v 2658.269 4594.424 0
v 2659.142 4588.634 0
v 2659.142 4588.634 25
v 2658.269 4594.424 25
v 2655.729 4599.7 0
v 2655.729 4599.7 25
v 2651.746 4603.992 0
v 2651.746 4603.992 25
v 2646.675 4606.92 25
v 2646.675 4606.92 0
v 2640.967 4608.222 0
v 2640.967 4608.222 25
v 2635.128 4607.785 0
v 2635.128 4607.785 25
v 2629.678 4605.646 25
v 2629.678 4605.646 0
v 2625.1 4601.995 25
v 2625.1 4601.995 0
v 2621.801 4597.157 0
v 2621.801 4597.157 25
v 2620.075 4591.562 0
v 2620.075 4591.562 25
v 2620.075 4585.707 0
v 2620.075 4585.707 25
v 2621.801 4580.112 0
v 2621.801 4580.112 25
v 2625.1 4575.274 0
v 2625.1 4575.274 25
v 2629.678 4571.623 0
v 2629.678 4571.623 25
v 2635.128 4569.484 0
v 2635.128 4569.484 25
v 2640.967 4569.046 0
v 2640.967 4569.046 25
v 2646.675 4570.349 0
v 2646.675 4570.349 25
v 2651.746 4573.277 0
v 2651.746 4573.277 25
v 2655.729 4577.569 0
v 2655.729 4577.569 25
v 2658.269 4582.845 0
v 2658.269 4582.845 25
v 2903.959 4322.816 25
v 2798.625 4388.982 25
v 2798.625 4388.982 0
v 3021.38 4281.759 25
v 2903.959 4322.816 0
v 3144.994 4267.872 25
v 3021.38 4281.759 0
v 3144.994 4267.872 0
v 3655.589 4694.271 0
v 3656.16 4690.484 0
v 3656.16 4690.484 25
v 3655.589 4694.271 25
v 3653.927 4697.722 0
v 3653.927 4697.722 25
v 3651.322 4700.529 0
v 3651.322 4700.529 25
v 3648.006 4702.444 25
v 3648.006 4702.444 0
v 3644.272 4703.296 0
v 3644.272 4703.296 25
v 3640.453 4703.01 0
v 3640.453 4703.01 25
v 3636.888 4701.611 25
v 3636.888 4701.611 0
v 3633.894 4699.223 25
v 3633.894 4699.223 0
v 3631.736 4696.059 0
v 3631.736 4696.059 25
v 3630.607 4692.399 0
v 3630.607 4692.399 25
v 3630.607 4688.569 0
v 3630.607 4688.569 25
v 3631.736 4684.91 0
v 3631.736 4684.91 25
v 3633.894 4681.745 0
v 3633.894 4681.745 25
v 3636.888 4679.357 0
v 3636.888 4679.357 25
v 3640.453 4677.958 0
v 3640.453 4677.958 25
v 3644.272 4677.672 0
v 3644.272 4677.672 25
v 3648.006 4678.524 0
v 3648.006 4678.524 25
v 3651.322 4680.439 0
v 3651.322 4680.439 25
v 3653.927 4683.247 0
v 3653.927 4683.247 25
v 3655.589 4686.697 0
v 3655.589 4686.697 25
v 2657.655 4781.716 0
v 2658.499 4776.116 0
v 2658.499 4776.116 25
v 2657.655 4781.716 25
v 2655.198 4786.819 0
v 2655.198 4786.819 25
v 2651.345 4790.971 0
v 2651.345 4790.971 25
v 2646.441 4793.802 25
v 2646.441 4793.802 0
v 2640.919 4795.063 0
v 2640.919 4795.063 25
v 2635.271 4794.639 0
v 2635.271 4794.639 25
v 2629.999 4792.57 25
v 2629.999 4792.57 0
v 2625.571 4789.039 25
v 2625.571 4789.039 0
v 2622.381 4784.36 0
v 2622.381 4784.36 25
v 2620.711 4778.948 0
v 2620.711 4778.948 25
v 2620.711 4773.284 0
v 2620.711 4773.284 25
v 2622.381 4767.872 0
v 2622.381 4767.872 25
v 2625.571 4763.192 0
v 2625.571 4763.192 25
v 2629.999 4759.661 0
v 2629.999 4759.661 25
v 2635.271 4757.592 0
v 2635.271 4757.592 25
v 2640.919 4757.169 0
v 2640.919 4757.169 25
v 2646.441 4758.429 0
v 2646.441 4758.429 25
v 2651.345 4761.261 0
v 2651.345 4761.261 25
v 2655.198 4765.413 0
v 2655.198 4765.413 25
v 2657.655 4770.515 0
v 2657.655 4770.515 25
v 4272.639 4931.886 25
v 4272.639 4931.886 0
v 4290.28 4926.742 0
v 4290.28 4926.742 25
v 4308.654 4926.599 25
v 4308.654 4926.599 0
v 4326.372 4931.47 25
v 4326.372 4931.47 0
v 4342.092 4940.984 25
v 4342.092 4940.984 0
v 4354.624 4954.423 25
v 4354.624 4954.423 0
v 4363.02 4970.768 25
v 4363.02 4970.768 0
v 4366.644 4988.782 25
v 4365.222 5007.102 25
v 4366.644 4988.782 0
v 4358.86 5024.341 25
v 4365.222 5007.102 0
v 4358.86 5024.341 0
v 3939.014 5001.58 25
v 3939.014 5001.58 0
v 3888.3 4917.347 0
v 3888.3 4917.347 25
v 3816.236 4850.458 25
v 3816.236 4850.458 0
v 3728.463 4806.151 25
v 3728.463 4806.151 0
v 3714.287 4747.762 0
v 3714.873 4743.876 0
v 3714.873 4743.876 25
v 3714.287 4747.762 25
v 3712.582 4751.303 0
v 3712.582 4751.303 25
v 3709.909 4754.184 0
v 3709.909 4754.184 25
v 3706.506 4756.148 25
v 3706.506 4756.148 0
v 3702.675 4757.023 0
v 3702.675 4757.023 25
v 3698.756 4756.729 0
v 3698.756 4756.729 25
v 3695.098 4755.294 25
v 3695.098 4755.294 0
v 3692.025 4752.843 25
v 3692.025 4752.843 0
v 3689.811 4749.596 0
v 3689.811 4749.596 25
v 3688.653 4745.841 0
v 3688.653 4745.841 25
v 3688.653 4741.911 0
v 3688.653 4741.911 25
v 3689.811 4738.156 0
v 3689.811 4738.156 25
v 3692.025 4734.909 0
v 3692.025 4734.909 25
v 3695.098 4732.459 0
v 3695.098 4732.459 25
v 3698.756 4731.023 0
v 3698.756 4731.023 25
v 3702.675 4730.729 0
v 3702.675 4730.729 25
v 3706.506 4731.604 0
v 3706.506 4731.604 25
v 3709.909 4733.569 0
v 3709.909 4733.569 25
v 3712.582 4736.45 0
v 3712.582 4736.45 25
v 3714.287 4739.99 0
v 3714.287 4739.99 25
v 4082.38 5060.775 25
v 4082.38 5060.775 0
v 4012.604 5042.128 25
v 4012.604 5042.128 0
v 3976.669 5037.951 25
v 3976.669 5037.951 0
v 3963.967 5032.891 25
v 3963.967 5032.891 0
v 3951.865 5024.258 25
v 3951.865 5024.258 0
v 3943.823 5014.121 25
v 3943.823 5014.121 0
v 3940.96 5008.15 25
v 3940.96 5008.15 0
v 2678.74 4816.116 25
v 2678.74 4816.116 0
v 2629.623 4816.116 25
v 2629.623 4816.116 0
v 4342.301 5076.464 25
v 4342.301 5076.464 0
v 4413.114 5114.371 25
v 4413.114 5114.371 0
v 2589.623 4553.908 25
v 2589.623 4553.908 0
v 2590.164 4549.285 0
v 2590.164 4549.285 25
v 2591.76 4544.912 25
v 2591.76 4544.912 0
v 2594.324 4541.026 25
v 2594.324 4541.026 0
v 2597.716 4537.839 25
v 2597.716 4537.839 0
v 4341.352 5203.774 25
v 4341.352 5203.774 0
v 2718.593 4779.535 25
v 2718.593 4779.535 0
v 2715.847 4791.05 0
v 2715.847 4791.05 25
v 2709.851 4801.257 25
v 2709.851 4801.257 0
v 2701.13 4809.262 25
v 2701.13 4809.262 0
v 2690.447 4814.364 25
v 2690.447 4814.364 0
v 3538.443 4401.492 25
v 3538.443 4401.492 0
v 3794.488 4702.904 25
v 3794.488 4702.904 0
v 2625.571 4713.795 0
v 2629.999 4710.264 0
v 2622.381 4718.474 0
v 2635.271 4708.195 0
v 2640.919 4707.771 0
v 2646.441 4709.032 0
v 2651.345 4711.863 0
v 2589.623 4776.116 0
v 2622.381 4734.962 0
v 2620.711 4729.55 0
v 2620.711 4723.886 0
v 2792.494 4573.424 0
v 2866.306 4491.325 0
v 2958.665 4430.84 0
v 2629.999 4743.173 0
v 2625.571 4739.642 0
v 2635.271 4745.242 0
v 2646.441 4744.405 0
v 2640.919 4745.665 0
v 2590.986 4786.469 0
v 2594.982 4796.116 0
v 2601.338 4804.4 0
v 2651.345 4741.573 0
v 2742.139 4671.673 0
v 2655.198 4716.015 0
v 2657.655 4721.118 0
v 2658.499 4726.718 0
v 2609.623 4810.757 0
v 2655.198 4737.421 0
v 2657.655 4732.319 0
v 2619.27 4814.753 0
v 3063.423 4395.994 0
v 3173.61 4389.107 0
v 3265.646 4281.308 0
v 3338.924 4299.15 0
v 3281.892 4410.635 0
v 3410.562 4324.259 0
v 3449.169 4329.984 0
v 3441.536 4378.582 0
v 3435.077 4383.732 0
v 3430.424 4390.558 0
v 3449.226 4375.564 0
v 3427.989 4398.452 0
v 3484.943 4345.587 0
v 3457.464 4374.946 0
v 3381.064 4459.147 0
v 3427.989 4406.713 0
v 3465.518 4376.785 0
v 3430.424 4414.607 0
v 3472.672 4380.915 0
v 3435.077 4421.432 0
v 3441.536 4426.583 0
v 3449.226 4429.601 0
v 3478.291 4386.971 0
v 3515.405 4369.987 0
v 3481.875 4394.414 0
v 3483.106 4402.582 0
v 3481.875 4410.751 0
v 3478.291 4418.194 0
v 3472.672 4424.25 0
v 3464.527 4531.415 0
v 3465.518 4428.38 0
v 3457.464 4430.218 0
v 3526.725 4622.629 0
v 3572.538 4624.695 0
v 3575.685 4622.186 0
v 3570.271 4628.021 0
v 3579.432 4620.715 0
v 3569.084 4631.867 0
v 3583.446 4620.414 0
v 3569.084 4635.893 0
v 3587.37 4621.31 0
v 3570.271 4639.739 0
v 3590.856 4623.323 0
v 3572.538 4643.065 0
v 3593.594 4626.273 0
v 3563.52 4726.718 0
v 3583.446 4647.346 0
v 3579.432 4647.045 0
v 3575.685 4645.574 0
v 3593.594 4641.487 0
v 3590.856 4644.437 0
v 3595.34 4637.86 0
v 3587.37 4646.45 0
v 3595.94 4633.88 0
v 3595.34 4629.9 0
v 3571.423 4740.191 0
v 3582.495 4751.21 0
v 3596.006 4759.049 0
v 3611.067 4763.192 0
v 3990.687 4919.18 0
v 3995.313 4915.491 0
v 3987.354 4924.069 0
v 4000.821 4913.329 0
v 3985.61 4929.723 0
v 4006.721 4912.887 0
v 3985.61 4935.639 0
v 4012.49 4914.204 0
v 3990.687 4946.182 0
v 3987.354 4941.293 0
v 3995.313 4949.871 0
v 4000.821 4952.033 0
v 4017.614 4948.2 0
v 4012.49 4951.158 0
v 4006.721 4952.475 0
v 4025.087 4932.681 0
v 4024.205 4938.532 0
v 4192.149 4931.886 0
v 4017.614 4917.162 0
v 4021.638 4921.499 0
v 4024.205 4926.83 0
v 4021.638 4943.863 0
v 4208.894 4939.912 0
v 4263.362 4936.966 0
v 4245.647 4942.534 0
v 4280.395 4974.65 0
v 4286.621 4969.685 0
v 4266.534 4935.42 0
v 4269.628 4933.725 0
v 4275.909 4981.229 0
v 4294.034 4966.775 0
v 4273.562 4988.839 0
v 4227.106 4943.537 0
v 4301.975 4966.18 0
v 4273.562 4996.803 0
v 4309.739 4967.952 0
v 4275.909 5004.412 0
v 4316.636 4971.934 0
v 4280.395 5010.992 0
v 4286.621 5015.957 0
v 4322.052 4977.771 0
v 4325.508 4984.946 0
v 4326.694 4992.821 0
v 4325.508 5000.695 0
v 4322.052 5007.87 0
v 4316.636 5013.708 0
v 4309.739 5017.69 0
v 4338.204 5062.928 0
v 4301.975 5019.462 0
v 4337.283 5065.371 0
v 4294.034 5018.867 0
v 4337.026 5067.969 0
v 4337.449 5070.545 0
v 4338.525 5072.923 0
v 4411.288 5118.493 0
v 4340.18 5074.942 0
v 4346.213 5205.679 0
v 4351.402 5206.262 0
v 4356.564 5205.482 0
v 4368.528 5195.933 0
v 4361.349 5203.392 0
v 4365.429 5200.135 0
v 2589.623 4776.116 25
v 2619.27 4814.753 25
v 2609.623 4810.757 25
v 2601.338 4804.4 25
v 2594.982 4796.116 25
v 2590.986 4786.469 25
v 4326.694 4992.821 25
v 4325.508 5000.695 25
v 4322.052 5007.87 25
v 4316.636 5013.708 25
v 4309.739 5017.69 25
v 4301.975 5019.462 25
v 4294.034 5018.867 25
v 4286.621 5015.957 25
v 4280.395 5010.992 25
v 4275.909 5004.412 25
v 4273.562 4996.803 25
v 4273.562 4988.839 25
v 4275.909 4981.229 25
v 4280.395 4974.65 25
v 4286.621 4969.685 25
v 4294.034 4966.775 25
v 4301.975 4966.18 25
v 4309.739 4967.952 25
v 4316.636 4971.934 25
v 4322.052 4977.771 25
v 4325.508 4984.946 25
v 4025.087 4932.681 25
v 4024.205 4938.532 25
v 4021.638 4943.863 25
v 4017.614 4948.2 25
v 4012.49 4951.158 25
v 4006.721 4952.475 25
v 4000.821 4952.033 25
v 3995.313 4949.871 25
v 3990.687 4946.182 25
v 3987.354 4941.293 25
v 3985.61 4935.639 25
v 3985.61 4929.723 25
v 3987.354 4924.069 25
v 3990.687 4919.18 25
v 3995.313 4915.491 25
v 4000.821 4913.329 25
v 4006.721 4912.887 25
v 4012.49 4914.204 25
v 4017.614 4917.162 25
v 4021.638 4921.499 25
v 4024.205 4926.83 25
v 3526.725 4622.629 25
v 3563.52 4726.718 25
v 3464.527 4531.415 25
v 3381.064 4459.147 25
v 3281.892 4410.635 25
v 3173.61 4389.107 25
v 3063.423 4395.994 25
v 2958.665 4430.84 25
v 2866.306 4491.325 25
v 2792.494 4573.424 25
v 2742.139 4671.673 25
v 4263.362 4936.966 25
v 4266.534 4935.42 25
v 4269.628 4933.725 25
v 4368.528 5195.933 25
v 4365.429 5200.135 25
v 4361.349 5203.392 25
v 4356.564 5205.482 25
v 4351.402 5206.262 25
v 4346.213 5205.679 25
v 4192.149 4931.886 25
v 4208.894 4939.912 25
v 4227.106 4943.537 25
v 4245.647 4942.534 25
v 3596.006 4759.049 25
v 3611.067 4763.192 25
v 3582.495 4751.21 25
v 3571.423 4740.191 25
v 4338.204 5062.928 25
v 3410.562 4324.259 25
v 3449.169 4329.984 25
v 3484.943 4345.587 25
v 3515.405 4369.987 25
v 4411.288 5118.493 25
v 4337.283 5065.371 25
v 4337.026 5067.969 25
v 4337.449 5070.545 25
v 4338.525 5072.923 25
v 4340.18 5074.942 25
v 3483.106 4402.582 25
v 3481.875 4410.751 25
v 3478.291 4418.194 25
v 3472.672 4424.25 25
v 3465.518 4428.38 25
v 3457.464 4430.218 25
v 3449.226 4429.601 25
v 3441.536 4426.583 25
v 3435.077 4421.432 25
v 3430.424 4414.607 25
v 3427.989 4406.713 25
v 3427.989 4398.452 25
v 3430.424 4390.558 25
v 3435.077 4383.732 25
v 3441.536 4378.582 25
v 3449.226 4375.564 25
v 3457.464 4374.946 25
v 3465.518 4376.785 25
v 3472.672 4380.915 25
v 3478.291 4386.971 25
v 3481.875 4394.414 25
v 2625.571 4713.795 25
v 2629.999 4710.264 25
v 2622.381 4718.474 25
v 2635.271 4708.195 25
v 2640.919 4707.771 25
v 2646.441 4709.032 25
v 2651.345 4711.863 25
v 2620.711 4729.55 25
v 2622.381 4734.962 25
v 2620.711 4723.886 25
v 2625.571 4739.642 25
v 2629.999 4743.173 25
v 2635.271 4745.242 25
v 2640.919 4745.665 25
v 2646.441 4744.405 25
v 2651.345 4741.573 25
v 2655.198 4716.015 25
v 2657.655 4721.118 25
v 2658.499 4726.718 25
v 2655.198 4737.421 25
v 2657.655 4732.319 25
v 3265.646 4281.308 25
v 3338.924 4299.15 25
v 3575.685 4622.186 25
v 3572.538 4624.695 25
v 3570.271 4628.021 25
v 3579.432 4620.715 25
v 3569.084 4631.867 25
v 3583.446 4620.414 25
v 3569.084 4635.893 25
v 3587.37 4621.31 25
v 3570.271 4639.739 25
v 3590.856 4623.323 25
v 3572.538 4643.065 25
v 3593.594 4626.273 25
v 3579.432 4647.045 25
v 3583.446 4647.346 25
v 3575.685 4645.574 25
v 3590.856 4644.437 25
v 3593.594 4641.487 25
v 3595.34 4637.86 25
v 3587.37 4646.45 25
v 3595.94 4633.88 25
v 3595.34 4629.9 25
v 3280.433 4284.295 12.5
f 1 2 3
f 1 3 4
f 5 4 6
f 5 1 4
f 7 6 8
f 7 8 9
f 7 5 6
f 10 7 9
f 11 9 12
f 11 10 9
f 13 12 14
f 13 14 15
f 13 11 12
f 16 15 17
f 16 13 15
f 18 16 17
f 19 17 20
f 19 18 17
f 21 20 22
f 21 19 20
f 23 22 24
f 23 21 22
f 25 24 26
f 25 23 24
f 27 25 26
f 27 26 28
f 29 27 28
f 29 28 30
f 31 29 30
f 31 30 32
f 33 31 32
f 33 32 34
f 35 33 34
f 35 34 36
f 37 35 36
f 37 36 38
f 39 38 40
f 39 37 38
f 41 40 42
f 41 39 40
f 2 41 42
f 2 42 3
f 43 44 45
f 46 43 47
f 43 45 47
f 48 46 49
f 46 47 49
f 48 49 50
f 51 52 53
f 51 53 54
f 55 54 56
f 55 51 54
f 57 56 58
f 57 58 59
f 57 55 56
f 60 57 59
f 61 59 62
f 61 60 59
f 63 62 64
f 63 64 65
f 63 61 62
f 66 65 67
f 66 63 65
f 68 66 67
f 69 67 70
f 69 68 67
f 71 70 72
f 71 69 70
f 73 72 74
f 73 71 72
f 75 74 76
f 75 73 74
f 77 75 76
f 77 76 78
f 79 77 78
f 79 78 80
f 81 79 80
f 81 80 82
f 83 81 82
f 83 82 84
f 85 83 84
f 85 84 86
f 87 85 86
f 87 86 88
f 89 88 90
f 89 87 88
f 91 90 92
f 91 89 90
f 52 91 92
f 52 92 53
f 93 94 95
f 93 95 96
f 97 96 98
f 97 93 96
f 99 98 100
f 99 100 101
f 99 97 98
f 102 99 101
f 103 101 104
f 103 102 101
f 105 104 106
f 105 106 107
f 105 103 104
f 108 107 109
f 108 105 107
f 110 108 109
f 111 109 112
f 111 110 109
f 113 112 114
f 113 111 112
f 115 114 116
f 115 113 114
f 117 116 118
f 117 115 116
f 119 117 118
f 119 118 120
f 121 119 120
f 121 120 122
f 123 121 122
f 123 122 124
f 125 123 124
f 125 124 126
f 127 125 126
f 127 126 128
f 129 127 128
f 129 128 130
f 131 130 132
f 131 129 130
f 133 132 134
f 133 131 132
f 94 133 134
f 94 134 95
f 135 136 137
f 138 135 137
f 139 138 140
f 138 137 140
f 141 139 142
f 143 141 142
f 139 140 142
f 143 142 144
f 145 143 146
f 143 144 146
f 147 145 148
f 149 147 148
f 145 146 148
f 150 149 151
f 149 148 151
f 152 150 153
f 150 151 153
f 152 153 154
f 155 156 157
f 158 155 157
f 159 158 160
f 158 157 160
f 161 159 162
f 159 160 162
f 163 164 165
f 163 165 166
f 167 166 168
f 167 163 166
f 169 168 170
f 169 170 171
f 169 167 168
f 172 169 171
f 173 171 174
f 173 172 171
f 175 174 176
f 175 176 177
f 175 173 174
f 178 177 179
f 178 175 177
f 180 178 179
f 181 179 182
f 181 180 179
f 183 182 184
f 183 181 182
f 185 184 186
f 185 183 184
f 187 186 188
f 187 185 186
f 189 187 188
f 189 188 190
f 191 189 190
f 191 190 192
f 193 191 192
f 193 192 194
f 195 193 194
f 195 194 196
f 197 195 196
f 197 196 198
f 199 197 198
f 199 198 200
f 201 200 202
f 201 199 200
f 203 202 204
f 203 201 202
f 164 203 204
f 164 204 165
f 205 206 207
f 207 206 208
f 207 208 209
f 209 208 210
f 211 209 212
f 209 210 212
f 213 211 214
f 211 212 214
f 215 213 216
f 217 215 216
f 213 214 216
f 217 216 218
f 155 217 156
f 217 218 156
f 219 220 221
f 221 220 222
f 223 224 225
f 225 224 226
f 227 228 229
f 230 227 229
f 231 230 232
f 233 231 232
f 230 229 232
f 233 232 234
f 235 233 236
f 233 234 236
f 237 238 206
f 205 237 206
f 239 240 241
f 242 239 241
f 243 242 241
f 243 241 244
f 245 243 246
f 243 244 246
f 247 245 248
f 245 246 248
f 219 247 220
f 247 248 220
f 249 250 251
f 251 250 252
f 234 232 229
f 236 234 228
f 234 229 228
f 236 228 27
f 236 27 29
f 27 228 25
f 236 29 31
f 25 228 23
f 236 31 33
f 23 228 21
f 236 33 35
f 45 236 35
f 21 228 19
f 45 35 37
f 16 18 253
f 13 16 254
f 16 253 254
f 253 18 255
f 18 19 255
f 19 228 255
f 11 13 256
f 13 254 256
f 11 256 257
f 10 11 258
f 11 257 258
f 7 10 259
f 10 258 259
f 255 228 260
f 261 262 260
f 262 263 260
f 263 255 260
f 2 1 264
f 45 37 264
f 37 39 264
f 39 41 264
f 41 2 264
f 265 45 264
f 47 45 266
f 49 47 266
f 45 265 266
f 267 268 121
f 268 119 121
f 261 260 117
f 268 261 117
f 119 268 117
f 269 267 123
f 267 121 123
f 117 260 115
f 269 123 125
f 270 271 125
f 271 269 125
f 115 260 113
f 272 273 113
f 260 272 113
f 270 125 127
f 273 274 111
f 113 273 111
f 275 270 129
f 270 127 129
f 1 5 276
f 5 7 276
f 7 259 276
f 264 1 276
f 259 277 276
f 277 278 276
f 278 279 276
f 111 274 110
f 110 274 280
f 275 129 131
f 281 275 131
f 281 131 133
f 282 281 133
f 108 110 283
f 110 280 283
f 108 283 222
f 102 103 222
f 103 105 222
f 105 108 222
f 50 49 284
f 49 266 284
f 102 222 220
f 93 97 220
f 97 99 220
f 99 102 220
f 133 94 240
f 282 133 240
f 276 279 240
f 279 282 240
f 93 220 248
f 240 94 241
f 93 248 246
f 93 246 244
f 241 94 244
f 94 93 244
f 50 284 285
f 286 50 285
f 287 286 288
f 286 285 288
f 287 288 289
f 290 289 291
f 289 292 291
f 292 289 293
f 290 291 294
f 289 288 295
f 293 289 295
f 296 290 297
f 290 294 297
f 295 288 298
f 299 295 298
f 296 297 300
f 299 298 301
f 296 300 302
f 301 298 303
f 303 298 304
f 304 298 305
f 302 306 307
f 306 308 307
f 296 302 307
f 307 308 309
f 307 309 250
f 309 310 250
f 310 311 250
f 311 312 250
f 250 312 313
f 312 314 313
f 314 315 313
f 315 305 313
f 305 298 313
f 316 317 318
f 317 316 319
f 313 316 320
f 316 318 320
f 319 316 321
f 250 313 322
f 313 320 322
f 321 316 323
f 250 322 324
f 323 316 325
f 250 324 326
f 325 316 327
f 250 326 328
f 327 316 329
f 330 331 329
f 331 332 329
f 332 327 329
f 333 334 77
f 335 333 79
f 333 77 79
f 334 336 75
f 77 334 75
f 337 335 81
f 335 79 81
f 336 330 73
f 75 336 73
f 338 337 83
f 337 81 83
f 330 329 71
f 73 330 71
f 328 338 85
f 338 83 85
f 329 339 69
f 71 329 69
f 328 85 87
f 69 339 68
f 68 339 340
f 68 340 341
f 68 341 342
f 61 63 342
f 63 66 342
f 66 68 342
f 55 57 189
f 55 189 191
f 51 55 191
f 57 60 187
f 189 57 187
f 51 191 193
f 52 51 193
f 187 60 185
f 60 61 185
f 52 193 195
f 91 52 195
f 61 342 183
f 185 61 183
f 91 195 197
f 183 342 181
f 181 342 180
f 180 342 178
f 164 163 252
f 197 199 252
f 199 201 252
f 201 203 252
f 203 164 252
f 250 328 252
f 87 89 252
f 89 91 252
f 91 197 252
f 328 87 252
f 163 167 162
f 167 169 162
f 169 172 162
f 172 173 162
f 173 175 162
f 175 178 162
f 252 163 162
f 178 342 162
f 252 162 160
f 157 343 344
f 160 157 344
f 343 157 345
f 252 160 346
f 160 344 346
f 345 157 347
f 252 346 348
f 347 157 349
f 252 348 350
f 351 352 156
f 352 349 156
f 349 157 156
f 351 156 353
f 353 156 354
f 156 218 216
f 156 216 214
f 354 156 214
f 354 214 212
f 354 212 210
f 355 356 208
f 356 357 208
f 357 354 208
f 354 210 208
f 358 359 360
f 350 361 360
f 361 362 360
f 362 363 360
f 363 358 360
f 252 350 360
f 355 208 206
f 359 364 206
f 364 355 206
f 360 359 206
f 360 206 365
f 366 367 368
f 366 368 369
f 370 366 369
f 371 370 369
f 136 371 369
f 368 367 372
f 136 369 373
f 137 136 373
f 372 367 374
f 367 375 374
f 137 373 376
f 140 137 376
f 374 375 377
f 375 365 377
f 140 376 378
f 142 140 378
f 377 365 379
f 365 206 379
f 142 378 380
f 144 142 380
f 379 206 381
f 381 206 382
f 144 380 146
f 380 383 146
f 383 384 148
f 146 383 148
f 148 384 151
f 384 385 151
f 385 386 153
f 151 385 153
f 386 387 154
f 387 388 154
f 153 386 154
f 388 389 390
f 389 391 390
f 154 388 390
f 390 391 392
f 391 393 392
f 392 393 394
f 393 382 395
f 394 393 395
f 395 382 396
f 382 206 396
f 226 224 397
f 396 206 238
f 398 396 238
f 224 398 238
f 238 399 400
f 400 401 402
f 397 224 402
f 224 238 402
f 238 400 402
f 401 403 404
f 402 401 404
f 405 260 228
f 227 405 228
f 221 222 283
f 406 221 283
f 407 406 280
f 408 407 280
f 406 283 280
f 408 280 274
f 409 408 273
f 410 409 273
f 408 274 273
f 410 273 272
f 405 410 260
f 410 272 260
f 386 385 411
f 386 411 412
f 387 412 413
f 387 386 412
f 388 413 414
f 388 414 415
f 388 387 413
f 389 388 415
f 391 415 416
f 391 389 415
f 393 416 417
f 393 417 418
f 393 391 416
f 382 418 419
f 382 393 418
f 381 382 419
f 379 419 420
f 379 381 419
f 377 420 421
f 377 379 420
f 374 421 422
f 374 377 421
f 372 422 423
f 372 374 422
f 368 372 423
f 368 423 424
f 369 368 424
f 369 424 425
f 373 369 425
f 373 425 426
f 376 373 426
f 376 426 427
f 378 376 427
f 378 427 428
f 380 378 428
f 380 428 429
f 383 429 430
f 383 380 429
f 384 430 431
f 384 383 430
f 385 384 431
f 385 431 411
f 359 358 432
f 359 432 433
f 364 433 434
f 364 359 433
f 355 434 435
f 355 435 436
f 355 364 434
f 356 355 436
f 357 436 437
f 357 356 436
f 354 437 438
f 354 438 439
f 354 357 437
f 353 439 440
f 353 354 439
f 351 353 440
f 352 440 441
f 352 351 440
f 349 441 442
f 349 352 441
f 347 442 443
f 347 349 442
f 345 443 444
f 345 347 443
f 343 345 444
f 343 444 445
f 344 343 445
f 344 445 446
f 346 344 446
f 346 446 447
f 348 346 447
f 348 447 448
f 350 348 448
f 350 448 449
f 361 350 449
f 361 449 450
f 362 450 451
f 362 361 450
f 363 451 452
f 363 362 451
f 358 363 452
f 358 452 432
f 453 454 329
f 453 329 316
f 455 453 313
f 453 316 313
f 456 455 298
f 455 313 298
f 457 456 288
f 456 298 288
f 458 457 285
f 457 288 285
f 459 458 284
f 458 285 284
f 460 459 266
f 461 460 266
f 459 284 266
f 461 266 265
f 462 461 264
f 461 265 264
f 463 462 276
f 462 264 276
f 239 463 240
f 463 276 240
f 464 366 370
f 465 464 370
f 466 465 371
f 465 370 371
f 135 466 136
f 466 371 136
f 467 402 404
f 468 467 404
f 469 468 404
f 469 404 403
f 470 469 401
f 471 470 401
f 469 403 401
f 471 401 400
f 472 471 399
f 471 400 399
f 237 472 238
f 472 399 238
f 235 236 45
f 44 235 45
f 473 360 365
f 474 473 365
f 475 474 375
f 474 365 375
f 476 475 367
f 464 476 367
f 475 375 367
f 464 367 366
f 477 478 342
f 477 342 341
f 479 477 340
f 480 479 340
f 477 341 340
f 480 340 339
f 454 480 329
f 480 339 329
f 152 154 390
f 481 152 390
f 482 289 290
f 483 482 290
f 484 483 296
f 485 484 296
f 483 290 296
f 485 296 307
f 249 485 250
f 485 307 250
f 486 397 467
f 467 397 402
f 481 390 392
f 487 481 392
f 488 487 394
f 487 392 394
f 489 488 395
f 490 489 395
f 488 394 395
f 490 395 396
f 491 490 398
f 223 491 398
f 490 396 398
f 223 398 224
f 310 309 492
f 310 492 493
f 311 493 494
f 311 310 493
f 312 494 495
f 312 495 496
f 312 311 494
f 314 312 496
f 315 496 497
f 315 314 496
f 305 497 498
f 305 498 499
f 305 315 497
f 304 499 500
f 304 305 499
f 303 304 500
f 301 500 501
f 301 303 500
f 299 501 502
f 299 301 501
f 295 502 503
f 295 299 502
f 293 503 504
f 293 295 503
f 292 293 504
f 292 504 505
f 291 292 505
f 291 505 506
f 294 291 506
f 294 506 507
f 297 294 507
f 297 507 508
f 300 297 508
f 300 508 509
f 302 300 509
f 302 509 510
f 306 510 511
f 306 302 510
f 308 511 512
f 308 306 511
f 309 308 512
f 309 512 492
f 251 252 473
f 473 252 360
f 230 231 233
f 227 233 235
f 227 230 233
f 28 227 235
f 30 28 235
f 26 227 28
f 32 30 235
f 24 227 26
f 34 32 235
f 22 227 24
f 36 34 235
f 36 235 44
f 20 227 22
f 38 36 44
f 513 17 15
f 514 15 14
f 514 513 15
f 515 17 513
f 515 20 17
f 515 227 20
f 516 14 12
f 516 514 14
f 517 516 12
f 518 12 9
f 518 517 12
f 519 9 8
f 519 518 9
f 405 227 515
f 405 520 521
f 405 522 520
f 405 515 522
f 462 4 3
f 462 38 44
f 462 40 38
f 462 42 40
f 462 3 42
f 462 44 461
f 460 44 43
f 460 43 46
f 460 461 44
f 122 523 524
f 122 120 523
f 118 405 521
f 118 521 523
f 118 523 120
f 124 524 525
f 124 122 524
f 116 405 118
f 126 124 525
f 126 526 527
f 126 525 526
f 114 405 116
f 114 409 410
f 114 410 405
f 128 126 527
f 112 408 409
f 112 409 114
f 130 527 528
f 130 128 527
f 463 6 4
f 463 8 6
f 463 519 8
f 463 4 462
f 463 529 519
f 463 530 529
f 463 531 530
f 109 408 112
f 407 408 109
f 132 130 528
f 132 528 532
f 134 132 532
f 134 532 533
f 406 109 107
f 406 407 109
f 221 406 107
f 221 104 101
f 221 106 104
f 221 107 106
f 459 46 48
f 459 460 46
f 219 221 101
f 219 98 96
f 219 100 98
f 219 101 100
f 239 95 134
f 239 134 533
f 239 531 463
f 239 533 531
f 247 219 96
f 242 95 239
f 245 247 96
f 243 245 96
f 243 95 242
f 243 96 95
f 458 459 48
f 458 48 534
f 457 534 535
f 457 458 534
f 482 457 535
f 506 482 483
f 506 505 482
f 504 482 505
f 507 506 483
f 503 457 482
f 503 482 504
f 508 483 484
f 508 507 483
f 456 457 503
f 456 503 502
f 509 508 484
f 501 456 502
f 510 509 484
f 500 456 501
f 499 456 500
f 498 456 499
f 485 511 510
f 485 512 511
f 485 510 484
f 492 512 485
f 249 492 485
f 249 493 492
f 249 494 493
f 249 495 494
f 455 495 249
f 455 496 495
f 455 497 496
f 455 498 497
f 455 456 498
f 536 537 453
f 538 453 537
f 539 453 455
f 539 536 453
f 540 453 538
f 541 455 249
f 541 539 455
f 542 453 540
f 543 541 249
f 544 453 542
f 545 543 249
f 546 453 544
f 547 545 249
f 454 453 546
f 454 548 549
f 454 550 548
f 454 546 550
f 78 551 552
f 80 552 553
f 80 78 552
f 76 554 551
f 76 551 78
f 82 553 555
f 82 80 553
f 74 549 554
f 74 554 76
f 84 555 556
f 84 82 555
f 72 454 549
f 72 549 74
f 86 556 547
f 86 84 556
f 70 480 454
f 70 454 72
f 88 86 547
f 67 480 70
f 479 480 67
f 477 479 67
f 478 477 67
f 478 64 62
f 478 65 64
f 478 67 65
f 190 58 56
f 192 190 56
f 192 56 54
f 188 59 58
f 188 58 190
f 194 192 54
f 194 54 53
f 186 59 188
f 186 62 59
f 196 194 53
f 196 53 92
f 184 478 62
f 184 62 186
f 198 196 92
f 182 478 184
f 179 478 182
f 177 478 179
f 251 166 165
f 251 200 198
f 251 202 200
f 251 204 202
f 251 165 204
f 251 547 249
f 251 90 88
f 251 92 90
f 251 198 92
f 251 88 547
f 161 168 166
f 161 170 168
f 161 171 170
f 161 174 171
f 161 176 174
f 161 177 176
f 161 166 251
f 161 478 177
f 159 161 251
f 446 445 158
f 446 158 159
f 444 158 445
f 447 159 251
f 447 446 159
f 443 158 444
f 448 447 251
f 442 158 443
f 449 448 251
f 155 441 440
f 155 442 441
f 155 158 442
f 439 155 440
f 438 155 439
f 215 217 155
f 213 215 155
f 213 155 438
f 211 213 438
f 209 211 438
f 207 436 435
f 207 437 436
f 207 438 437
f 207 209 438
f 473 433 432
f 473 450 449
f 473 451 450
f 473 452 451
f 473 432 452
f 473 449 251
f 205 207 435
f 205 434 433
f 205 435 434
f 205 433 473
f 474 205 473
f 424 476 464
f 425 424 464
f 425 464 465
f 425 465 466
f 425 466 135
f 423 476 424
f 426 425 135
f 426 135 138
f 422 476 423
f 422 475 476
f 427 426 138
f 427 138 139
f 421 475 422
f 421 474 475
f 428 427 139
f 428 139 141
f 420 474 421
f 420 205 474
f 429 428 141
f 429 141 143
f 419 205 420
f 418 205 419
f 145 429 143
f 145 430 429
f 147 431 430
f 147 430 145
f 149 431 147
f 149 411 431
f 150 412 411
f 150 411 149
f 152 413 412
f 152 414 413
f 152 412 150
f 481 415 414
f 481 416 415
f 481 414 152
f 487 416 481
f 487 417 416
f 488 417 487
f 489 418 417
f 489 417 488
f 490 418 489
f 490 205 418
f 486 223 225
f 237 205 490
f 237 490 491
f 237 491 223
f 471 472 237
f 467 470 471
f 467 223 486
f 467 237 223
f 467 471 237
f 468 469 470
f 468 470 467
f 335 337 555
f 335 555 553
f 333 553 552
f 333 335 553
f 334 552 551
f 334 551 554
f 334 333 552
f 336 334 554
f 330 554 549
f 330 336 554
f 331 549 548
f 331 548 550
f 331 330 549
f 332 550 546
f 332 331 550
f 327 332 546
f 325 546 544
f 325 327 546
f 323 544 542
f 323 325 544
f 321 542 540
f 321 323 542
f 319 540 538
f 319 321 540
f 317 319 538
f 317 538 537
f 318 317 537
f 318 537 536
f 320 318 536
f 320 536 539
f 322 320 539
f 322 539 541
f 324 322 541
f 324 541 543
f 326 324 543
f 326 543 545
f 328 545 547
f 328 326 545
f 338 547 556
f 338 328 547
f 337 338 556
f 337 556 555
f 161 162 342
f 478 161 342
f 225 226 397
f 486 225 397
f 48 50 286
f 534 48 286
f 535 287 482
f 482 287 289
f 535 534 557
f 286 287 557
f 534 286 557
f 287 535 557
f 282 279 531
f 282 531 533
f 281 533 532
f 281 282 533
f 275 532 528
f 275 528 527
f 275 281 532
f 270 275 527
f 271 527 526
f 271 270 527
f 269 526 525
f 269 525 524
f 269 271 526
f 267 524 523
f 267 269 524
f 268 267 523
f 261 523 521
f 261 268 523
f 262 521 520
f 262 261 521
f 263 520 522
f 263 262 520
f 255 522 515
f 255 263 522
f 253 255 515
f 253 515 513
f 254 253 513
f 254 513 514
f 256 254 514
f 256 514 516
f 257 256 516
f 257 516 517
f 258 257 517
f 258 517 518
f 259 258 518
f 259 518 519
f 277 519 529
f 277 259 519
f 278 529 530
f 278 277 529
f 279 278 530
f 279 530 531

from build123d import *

# Parameters (mm, degrees)
ESBO_O1_R                = 27.71344859
ESBO_O1_R_2              = 19.642943244
ESBO_O1_R_3              = 19
ESBO_O1_R_4              = 13.503376128
ESBO_O1_R_5              = 12.848056377
ESBO_O1_R_6              = 13.183675058
ESBO_O1_R_7              = 19.84940304
ESBO_O1_R_8              = 26.715530758
RESSALTO_EXTRUS_O1_DEPTH = 25


with BuildPart() as part:
    # Esboço1 → Ressalto-extrusão1 (new body)
    with BuildSketch(Plane.XY):
        with BuildLine():
            Line((4413.114192809, 5114.37123775), (4411.288420867, 5118.493395975))
            Line((4411.288420867, 5118.493395975), (4368.528056031, 5195.933053436))
            ThreePointArc((4368.528056031, 5195.933053436), (4356.563983348, 5205.481641807), (4341.352234835, 5203.77363647))
            Line((4341.352234835, 5203.77363647), (4082.380260599, 5060.775378681))
            add(Edge.make_bspline(
                [(4082.380260599, 5060.775378681), (4060.653279964, 5053.050323004), (4026.458640538, 5040.417178177), (3971.383313993, 5041.975441307), (3943.204327614, 5021.389877069), (3939.014113572, 5001.580075286)],
                knots=[0, 0, 0, 0, 0.428929879, 0.656274084, 1, 1, 1, 1], degree=3))
            ThreePointArc((3939.014113572, 5001.580075286), (3854.618299216, 4881.369865741), (3728.462541381, 4806.151033491))
            Line((3728.462541381, 4806.151033491), (3611.066608375, 4763.191643283))
            ThreePointArc((3611.066608375, 4763.191643283), (3582.494949017, 4751.209944567), (3563.519721499, 4726.718281428))
            ThreePointArc((3563.519721499, 4726.718281428), (3118.29371103, 4388.982433408), (2718.593133711, 4779.534801123))
            ThreePointArc((2718.593133711, 4779.534801123), (2705.787983512, 4805.584059889), (2678.739524891, 4816.115756812))
            Line((2678.739524891, 4816.115756812), (2629.622746024, 4816.115756812))
            ThreePointArc((2629.622746024, 4816.115756812), (2601.338474777, 4804.400028059), (2589.622746024, 4776.115756812))
            Line((2589.622746024, 4776.115756812), (2589.622746024, 4553.908462806))
            ThreePointArc((2589.622746024, 4553.908462806), (2591.760392869, 4544.912000181), (2597.716380001, 4537.838663551))
            Line((2597.716380001, 4537.838663551), (2798.624846243, 4388.982433408))
            ThreePointArc((2798.624846243, 4388.982433408), (2961.516175194, 4298.989299254), (3144.993895299, 4267.872174271))
            add(Edge.make_bspline(
                [(3144.993895299, 4267.872174271), (3283.087901646, 4272.524252265), (3410.561847837, 4324.25862746)],
                knots=[0, 0, 0, 1, 1, 1], degree=2))
            ThreePointArc((3410.561847837, 4324.25862746), (3484.943379958, 4345.587286722), (3538.443267038, 4401.491545139))
            Line((3538.443267038, 4401.491545139), (3794.487917499, 4702.904338366))
            Line((3794.487917499, 4702.904338366), (4192.149360938, 4931.885643495))
            ThreePointArc((4192.149360938, 4931.885643495), (4227.105543109, 4943.536998483), (4263.361778436, 4936.966294947))
            ThreePointArc((4263.361778436, 4936.966294947), (4268.091109103, 4934.591237745), (4272.639430224, 4931.885643495))
            ThreePointArc((4272.639430224, 4931.885643495), (4348.822764296, 4947.270554666), (4358.86043695, 5024.340918684))
            Line((4358.86043695, 5024.340918684), (4338.204141009, 5062.928165106))
            ThreePointArc((4338.204141009, 5062.928165106), (4337.44919525, 5070.544509417), (4342.300936695, 5076.463905392))
            Line((4342.300936695, 5076.463905392), (4413.114192809, 5114.37123775))
        make_face()
        with Locations((3455.392827489, 4402.582392469)):
            Circle(ESBO_O1_R, mode=Mode.SUBTRACT)
        with Locations((2639.499035595, 4588.634415219)):
            Circle(ESBO_O1_R_2, mode=Mode.SUBTRACT)
        with Locations((2639.499035595, 4726.718281428)):
            Circle(ESBO_O1_R_3, mode=Mode.SUBTRACT)
        with Locations((3582.436878638, 4633.880010415)):
            Circle(ESBO_O1_R_4, mode=Mode.SUBTRACT)
        with Locations((3643.311799709, 4690.484232349)):
            Circle(ESBO_O1_R_5, mode=Mode.SUBTRACT)
        with Locations((2639.499035595, 4776.115756812)):
            Circle(ESBO_O1_R_3, mode=Mode.SUBTRACT)
        with Locations((3701.689462413, 4743.876157041)):
            Circle(ESBO_O1_R_6, mode=Mode.SUBTRACT)
        with Locations((4005.237906418, 4932.680988887)):
            Circle(ESBO_O1_R_7, mode=Mode.SUBTRACT)
        with Locations((4299.978946887, 4992.820828576)):
            Circle(ESBO_O1_R_8, mode=Mode.SUBTRACT)
    extrude(amount=RESSALTO_EXTRUS_O1_DEPTH)


solid = part.part
